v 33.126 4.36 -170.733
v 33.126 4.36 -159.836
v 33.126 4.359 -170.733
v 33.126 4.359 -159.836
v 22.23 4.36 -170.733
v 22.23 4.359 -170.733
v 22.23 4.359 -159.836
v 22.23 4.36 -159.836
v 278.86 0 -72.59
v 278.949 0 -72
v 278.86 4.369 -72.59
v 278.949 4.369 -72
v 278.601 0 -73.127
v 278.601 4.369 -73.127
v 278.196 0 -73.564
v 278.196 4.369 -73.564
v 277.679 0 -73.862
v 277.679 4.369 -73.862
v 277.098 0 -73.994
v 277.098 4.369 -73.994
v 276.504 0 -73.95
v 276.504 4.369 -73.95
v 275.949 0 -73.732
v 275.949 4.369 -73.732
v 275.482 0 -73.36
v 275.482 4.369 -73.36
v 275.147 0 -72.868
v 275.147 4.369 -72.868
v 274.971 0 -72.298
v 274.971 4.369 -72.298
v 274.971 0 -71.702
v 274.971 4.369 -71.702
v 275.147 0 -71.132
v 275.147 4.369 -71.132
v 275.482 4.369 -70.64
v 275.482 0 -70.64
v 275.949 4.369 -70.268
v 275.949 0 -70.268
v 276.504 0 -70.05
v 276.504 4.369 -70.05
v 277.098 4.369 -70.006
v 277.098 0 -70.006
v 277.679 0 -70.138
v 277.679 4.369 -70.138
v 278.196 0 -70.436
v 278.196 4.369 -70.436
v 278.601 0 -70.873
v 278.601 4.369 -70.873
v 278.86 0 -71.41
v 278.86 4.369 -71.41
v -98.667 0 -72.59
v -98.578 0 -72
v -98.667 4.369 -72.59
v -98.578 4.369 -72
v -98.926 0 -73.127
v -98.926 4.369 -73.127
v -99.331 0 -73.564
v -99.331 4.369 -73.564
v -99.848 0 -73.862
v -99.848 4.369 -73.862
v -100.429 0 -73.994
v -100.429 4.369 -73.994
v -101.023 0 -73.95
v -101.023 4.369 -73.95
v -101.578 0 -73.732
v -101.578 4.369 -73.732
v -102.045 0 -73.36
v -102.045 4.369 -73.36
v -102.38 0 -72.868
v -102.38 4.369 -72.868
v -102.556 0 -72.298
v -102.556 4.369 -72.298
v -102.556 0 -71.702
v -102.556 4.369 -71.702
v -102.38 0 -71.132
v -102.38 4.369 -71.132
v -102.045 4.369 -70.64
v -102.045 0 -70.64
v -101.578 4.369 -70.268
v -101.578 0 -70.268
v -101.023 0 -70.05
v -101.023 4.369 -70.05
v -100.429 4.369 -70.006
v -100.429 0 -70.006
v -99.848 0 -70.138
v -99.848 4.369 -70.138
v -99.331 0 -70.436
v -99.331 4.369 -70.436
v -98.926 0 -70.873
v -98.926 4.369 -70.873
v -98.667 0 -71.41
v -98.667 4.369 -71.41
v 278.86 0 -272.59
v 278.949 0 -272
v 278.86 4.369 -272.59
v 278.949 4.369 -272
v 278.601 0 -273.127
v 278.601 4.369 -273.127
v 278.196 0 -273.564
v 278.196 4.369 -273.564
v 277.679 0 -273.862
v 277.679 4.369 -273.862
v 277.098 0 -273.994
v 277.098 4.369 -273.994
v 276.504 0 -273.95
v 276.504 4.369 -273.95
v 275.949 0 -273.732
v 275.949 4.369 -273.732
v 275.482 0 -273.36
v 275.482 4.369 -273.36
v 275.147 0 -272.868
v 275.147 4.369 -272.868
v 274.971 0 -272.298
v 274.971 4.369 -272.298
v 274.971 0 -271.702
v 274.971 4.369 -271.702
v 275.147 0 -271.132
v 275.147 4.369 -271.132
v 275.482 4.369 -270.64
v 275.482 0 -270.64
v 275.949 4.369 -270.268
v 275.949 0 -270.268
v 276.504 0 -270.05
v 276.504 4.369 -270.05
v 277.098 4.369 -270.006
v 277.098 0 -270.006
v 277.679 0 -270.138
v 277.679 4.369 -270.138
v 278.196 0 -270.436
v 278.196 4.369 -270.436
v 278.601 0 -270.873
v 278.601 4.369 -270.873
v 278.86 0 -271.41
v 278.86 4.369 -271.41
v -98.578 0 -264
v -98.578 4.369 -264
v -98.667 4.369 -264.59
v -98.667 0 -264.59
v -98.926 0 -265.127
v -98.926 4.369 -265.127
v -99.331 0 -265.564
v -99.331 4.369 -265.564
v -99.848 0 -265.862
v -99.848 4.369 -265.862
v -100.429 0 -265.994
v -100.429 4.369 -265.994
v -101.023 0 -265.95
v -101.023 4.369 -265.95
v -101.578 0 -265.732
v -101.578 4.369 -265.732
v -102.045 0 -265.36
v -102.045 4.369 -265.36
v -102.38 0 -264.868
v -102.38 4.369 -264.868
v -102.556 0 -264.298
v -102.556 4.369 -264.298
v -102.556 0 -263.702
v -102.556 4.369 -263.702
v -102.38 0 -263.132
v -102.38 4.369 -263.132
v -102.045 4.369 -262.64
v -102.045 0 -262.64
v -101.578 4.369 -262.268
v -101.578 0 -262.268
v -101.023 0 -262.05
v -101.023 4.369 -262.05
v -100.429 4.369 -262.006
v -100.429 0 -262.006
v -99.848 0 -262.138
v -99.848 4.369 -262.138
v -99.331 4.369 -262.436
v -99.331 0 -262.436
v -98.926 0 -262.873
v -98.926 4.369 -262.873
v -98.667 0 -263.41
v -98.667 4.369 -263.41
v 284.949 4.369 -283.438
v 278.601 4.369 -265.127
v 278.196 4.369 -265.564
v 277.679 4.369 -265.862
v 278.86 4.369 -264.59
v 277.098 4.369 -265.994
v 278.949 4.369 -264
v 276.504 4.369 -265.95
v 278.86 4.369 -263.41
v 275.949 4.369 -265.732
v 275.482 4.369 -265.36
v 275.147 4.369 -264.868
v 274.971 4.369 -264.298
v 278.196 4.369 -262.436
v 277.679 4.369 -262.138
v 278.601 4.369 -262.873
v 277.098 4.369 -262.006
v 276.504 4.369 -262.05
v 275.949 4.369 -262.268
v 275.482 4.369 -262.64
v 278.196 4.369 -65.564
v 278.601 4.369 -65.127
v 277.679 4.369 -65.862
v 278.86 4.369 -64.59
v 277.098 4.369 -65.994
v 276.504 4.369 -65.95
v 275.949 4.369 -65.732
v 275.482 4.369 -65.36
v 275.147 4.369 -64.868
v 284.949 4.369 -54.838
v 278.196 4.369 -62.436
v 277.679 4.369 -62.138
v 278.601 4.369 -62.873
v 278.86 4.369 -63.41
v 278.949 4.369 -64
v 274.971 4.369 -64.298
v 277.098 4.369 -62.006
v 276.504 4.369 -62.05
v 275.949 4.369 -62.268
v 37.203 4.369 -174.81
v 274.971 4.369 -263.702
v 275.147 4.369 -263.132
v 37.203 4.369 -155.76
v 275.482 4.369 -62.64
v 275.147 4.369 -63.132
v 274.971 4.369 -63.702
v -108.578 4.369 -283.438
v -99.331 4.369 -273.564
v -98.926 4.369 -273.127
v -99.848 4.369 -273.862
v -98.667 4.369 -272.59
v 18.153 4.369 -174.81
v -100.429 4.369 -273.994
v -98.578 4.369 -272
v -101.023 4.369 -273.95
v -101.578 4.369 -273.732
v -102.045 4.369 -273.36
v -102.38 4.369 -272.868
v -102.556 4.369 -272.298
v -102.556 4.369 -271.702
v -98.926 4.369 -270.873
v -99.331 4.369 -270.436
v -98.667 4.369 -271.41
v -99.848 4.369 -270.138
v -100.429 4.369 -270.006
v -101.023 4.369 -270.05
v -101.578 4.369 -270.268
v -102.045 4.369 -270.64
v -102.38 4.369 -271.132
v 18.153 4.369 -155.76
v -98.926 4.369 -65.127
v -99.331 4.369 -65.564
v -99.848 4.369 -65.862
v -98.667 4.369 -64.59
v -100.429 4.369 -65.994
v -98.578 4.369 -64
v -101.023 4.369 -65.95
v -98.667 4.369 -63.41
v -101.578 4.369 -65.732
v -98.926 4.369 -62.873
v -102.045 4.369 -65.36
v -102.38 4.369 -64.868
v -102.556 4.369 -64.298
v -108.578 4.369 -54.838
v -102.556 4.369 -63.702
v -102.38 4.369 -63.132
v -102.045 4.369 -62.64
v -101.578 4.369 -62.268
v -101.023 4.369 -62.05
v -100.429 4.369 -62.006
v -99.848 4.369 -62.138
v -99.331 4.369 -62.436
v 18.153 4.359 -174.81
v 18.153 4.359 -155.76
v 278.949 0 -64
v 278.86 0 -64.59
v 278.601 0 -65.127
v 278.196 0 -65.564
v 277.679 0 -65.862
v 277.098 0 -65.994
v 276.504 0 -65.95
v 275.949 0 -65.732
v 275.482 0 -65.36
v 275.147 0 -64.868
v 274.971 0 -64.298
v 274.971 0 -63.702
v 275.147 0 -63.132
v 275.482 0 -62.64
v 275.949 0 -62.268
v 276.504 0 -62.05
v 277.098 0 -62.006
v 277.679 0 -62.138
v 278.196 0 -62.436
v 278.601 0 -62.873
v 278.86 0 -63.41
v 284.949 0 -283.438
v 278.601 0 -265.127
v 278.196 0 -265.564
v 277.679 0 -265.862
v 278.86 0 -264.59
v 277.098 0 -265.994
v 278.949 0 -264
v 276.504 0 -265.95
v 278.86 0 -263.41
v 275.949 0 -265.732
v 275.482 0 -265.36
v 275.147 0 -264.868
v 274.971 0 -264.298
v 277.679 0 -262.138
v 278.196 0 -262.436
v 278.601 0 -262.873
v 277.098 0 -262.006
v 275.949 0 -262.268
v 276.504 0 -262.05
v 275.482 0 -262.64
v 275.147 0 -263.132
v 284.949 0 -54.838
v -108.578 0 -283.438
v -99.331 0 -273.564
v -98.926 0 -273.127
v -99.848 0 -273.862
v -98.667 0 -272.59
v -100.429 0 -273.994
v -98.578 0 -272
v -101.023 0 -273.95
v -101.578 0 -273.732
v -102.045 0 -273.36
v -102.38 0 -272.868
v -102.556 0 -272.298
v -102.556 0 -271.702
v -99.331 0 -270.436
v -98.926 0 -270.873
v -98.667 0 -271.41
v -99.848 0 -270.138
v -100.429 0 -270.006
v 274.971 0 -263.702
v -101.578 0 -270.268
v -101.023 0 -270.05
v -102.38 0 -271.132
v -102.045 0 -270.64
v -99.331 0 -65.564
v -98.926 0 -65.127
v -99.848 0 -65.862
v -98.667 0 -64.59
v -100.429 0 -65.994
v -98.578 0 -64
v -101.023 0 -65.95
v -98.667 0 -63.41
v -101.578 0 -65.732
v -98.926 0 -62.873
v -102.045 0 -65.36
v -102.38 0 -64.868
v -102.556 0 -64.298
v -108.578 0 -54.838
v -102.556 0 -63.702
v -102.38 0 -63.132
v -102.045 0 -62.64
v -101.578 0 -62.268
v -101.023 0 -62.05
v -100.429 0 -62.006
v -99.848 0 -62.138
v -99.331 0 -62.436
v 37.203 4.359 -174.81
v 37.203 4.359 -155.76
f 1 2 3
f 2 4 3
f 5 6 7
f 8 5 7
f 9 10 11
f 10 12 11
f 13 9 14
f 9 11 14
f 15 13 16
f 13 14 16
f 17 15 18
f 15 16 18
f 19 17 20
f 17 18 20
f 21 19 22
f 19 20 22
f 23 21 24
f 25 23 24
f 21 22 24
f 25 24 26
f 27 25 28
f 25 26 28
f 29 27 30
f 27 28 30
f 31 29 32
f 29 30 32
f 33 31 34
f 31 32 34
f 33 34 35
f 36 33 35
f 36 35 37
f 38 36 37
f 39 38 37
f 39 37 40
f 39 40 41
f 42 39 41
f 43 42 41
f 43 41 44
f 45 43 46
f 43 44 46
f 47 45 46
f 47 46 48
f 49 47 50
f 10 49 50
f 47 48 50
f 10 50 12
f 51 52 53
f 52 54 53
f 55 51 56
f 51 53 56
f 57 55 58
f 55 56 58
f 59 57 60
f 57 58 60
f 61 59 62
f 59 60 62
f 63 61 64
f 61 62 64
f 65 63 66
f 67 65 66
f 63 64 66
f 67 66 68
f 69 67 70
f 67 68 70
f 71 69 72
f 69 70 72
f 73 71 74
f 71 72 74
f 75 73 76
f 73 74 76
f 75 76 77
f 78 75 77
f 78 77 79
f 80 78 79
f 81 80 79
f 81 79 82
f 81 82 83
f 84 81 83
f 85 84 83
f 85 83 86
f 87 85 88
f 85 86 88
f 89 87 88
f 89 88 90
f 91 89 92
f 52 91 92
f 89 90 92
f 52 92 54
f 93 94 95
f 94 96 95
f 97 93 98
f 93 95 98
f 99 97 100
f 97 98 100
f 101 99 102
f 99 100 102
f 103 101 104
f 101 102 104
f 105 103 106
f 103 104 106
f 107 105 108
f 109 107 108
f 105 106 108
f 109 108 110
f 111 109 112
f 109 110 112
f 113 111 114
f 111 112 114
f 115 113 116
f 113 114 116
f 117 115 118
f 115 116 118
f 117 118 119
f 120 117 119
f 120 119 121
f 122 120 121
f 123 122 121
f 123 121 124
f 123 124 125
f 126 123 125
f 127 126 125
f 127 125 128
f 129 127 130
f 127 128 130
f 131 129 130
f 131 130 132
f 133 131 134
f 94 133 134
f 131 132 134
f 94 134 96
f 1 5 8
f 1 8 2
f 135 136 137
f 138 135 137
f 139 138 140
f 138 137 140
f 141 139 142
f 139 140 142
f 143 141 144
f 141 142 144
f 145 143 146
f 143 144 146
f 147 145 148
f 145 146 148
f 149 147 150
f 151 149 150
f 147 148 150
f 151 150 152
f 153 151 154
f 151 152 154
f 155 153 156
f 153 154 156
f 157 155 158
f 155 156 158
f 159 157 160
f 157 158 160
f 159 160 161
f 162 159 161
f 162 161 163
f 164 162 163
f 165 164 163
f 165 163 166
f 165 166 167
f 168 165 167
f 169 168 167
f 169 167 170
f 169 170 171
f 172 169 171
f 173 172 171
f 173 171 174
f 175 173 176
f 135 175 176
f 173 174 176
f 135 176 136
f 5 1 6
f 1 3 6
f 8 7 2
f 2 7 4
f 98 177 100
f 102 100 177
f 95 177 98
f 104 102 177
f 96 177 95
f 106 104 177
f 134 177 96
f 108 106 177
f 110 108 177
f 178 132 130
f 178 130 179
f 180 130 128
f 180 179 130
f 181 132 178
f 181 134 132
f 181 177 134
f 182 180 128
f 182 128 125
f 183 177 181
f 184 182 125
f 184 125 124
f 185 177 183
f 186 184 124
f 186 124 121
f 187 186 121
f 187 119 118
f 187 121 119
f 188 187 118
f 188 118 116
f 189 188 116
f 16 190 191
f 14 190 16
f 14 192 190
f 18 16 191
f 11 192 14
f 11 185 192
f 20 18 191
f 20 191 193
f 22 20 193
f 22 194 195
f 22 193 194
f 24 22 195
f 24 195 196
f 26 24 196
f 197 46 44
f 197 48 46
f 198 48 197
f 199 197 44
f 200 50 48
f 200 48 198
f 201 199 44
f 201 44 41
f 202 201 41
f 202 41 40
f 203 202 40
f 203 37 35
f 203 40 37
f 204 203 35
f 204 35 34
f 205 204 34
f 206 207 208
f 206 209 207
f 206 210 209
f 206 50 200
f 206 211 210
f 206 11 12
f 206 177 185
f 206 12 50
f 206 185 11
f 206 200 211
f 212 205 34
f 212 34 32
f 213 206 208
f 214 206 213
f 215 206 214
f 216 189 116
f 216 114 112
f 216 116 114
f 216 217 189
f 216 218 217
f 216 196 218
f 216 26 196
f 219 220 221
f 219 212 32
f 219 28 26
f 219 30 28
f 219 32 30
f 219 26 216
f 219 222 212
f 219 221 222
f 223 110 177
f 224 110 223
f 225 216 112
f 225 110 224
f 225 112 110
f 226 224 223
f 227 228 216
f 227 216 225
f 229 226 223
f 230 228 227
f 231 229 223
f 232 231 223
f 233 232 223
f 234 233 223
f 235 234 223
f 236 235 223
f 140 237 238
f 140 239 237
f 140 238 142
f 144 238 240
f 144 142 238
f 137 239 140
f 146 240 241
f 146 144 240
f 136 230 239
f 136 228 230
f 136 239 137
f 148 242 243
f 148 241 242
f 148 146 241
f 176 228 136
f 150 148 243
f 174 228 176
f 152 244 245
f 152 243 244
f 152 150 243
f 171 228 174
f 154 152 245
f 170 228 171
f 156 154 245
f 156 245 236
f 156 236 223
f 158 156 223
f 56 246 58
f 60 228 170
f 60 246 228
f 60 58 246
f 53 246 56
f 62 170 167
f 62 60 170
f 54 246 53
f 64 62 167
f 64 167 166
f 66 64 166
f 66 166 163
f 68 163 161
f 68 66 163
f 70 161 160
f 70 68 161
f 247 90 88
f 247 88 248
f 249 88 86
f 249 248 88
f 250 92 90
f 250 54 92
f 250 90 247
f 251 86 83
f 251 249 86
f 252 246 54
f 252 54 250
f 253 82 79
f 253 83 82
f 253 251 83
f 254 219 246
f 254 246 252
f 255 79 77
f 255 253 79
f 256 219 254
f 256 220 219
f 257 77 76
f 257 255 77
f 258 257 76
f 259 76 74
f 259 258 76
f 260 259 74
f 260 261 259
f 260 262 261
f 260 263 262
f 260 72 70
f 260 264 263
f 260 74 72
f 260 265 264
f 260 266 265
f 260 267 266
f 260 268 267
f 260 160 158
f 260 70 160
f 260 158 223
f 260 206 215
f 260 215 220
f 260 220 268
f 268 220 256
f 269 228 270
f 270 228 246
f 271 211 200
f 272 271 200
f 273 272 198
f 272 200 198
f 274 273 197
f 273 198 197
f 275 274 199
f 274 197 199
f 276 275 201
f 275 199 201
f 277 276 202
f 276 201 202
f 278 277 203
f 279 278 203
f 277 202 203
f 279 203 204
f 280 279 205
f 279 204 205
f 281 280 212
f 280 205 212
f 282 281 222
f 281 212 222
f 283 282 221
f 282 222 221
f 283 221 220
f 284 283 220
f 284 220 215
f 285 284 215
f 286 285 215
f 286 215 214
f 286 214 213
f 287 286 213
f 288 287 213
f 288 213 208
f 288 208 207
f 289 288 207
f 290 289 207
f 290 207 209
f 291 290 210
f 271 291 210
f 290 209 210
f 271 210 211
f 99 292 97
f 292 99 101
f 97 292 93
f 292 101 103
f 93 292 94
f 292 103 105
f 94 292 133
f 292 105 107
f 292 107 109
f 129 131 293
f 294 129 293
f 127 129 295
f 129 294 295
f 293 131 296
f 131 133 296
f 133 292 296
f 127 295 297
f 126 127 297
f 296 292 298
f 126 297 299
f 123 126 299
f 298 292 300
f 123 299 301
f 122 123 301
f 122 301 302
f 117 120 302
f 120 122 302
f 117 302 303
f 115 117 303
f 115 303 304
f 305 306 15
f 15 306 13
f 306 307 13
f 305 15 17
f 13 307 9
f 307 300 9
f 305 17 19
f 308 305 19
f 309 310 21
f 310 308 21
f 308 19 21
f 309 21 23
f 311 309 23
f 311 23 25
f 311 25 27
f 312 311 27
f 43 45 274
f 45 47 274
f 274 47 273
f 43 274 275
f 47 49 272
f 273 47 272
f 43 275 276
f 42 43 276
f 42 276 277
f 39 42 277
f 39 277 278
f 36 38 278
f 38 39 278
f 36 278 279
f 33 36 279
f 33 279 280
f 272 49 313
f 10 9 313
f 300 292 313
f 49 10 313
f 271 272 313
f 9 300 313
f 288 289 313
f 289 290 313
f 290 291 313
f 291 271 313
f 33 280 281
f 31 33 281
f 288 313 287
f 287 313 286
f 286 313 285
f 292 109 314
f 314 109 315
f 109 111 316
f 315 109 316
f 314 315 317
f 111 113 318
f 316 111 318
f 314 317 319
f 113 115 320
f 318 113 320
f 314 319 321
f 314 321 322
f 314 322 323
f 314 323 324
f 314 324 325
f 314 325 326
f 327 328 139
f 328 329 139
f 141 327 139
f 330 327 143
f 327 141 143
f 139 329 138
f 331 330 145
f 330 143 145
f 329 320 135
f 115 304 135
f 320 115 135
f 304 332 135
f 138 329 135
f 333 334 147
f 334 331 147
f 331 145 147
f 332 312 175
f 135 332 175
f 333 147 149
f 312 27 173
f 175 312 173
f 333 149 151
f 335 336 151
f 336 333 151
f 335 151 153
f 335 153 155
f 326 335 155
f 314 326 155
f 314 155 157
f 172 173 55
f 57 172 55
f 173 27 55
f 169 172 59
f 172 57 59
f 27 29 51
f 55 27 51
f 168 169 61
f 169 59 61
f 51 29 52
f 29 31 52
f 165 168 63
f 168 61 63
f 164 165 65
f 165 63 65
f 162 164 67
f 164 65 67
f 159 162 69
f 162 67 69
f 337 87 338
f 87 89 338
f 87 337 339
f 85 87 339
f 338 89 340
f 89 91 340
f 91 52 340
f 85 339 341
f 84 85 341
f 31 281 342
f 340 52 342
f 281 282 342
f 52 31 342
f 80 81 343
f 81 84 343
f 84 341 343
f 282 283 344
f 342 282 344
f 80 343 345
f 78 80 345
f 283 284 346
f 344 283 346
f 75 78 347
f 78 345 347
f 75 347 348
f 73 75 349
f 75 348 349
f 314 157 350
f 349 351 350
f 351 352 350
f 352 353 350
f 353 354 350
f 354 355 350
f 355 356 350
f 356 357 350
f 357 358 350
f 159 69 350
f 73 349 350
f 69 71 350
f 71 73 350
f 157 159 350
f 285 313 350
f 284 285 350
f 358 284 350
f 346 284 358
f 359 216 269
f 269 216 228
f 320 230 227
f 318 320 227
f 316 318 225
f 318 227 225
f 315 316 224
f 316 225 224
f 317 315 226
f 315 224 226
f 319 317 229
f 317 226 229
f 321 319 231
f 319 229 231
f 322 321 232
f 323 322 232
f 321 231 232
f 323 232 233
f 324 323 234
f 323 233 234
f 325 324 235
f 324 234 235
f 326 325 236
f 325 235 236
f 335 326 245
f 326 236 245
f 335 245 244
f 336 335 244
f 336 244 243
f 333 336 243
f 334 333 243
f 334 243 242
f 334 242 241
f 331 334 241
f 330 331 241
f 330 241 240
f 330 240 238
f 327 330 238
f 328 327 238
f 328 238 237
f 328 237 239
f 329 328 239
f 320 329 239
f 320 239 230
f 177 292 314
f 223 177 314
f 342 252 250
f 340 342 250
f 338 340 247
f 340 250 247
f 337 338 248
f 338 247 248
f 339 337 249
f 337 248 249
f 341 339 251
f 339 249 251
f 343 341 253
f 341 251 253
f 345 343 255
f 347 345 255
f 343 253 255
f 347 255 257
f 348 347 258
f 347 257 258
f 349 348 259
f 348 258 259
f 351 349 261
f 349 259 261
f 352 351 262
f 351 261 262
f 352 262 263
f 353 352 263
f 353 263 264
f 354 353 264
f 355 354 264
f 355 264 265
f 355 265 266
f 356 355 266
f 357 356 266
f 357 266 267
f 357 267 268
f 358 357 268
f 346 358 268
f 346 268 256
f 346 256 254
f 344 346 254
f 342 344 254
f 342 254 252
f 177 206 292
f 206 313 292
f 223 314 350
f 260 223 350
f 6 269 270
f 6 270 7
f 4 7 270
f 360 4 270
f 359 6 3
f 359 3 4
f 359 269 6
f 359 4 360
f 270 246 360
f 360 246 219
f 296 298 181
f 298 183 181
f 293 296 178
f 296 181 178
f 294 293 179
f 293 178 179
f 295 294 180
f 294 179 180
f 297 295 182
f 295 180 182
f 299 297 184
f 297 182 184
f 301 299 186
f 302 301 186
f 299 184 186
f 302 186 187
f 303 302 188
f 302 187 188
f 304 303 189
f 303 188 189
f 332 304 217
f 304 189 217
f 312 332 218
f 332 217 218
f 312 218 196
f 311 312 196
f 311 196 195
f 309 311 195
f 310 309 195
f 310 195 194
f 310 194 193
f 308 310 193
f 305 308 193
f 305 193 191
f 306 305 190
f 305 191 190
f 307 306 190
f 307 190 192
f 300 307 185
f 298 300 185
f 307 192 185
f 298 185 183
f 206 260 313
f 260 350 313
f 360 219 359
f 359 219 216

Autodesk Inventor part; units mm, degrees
ref_plane "YZ Plane" through (0, 0, 0) normal (1, 0, 0) x (0, 1, 0)
ref_plane "XZ Plane" through (0, 0, 0) normal (0, 1, 0) x (-1, 0, 0)
ref_plane "XY Plane" through (0, 0, 0) normal (0, 0, 1) x (1, 0, 0)
sketch "Sketch1" plane through (0, 0, 0) normal (0, 1, 0) x (-1, 0, 0)
  line L0 (108.5784, -54.8383) -> (-284.9486, -54.8383)
  line L1 (-284.9486, -54.8383) -> (-284.9486, -283.4383)
  line L2 (-284.9486, -283.4383) -> (108.5784, -283.4383)
  line L3 (108.5784, -283.4383) -> (108.5784, -54.8383)
  point P0 (0, 0)
  dimension "d0" = 393.527
  dimension "d1" = 228.6
extrude "Extrusion1" add sketch "Sketch1" along normal blind 4.3688
sketch "Sketch2" plane through (0, 4.3688, 0) normal (0, 1, 0) x (1, 0, 0)
  line L0 (-108.5784, 54.8383) -> (284.9486, 54.8383) construction
  line L1 (284.9486, 54.8383) -> (284.9486, 283.4383) construction
  line L2 (284.9486, 283.4383) -> (-108.5784, 283.4383) construction
  line L3 (-108.5784, 283.4383) -> (-108.5784, 54.8383) construction
  line L4 (88.1851, 283.4383) -> (88.1851, 54.8383) construction
  line L5 (268.9486, 0) -> (284.9486, 0) construction
  line L6 (284.9486, 0) -> (284.9486, 336) construction
  line L7 (268.9486, 336) -> (284.9486, 336) construction
  line L8 (268.9486, 336) -> (268.9486, 0) construction
  circle A0 centre (276.9486, 64) radius 2
  circle A1 centre (276.9486, 72) radius 2
  circle A2 centre (276.9486, 264) radius 2
  circle A3 centre (276.9486, 272) radius 2
  circle A4 centre (-100.5784, 264) radius 2
  circle A5 centre (-100.5784, 72) radius 2
  circle A6 centre (-100.5784, 64) radius 2
  circle A7 centre (-100.5784, 272) radius 2
  dimension "d16" = 64
  dimension "d17" = 72
  dimension "d20" = 64
  dimension "d21" = 72
  dimension "d24" = 4
  dimension "d25" = 4
  dimension "d26" = 4
  dimension "d27" = 4
  dimension "d28" = 9.1617
  dimension "d29" = 17.1617
  dimension "d30" = 19.4383
  dimension "d31" = 11.4383
  dimension "d34" = 8
  dimension "d35" = 8
  dimension "d36" = 8
  dimension "d37" = 8
  dimension "d38" = 8
extrude "Extrusion2" cut sketch "Sketch2" against normal up to next
sketch "Sketch3" plane through (0, 4.3688, 0) normal (0, 1, 0) x (1, 0, 0)
  line L0 (37.203, 174.8099) -> (18.153, 174.8099)
  line L1 (18.153, 174.8099) -> (18.153, 155.7599)
  line L2 (18.153, 155.7599) -> (37.203, 155.7599)
  line L3 (37.203, 155.7599) -> (37.203, 174.8099)
  point P0 (0, 0)
  dimension "d39" = 19.05
  dimension "d40" = 19.05
extrude "Extrusion3" cut sketch "Sketch3" against normal blind 0.01
sketch "Sketch4" plane through (0, 4.3588, 0) normal (0, 1, 0) x (1, 0, 0)
  line L0 (18.153, 155.7599) -> (18.153, 174.8099) construction
  line L1 (37.203, 155.7599) -> (18.153, 155.7599) construction
  line L2 (22.2295, 159.8364) -> (33.1265, 159.8364)
  line L3 (33.1265, 159.8364) -> (33.1265, 170.7334)
  line L4 (33.1265, 170.7334) -> (22.2295, 170.7334)
  line L5 (22.2295, 170.7334) -> (22.2295, 159.8364)
  point P0 (0, 0)
  dimension "d43" = 10.897
  dimension "d44" = 10.897
  dimension "d45" = 4.0765
  dimension "d46" = 4.0765
extrude "Extrusion4" add sketch "Sketch4" along normal blind 0.001
properties part number "Plexiglass base"
